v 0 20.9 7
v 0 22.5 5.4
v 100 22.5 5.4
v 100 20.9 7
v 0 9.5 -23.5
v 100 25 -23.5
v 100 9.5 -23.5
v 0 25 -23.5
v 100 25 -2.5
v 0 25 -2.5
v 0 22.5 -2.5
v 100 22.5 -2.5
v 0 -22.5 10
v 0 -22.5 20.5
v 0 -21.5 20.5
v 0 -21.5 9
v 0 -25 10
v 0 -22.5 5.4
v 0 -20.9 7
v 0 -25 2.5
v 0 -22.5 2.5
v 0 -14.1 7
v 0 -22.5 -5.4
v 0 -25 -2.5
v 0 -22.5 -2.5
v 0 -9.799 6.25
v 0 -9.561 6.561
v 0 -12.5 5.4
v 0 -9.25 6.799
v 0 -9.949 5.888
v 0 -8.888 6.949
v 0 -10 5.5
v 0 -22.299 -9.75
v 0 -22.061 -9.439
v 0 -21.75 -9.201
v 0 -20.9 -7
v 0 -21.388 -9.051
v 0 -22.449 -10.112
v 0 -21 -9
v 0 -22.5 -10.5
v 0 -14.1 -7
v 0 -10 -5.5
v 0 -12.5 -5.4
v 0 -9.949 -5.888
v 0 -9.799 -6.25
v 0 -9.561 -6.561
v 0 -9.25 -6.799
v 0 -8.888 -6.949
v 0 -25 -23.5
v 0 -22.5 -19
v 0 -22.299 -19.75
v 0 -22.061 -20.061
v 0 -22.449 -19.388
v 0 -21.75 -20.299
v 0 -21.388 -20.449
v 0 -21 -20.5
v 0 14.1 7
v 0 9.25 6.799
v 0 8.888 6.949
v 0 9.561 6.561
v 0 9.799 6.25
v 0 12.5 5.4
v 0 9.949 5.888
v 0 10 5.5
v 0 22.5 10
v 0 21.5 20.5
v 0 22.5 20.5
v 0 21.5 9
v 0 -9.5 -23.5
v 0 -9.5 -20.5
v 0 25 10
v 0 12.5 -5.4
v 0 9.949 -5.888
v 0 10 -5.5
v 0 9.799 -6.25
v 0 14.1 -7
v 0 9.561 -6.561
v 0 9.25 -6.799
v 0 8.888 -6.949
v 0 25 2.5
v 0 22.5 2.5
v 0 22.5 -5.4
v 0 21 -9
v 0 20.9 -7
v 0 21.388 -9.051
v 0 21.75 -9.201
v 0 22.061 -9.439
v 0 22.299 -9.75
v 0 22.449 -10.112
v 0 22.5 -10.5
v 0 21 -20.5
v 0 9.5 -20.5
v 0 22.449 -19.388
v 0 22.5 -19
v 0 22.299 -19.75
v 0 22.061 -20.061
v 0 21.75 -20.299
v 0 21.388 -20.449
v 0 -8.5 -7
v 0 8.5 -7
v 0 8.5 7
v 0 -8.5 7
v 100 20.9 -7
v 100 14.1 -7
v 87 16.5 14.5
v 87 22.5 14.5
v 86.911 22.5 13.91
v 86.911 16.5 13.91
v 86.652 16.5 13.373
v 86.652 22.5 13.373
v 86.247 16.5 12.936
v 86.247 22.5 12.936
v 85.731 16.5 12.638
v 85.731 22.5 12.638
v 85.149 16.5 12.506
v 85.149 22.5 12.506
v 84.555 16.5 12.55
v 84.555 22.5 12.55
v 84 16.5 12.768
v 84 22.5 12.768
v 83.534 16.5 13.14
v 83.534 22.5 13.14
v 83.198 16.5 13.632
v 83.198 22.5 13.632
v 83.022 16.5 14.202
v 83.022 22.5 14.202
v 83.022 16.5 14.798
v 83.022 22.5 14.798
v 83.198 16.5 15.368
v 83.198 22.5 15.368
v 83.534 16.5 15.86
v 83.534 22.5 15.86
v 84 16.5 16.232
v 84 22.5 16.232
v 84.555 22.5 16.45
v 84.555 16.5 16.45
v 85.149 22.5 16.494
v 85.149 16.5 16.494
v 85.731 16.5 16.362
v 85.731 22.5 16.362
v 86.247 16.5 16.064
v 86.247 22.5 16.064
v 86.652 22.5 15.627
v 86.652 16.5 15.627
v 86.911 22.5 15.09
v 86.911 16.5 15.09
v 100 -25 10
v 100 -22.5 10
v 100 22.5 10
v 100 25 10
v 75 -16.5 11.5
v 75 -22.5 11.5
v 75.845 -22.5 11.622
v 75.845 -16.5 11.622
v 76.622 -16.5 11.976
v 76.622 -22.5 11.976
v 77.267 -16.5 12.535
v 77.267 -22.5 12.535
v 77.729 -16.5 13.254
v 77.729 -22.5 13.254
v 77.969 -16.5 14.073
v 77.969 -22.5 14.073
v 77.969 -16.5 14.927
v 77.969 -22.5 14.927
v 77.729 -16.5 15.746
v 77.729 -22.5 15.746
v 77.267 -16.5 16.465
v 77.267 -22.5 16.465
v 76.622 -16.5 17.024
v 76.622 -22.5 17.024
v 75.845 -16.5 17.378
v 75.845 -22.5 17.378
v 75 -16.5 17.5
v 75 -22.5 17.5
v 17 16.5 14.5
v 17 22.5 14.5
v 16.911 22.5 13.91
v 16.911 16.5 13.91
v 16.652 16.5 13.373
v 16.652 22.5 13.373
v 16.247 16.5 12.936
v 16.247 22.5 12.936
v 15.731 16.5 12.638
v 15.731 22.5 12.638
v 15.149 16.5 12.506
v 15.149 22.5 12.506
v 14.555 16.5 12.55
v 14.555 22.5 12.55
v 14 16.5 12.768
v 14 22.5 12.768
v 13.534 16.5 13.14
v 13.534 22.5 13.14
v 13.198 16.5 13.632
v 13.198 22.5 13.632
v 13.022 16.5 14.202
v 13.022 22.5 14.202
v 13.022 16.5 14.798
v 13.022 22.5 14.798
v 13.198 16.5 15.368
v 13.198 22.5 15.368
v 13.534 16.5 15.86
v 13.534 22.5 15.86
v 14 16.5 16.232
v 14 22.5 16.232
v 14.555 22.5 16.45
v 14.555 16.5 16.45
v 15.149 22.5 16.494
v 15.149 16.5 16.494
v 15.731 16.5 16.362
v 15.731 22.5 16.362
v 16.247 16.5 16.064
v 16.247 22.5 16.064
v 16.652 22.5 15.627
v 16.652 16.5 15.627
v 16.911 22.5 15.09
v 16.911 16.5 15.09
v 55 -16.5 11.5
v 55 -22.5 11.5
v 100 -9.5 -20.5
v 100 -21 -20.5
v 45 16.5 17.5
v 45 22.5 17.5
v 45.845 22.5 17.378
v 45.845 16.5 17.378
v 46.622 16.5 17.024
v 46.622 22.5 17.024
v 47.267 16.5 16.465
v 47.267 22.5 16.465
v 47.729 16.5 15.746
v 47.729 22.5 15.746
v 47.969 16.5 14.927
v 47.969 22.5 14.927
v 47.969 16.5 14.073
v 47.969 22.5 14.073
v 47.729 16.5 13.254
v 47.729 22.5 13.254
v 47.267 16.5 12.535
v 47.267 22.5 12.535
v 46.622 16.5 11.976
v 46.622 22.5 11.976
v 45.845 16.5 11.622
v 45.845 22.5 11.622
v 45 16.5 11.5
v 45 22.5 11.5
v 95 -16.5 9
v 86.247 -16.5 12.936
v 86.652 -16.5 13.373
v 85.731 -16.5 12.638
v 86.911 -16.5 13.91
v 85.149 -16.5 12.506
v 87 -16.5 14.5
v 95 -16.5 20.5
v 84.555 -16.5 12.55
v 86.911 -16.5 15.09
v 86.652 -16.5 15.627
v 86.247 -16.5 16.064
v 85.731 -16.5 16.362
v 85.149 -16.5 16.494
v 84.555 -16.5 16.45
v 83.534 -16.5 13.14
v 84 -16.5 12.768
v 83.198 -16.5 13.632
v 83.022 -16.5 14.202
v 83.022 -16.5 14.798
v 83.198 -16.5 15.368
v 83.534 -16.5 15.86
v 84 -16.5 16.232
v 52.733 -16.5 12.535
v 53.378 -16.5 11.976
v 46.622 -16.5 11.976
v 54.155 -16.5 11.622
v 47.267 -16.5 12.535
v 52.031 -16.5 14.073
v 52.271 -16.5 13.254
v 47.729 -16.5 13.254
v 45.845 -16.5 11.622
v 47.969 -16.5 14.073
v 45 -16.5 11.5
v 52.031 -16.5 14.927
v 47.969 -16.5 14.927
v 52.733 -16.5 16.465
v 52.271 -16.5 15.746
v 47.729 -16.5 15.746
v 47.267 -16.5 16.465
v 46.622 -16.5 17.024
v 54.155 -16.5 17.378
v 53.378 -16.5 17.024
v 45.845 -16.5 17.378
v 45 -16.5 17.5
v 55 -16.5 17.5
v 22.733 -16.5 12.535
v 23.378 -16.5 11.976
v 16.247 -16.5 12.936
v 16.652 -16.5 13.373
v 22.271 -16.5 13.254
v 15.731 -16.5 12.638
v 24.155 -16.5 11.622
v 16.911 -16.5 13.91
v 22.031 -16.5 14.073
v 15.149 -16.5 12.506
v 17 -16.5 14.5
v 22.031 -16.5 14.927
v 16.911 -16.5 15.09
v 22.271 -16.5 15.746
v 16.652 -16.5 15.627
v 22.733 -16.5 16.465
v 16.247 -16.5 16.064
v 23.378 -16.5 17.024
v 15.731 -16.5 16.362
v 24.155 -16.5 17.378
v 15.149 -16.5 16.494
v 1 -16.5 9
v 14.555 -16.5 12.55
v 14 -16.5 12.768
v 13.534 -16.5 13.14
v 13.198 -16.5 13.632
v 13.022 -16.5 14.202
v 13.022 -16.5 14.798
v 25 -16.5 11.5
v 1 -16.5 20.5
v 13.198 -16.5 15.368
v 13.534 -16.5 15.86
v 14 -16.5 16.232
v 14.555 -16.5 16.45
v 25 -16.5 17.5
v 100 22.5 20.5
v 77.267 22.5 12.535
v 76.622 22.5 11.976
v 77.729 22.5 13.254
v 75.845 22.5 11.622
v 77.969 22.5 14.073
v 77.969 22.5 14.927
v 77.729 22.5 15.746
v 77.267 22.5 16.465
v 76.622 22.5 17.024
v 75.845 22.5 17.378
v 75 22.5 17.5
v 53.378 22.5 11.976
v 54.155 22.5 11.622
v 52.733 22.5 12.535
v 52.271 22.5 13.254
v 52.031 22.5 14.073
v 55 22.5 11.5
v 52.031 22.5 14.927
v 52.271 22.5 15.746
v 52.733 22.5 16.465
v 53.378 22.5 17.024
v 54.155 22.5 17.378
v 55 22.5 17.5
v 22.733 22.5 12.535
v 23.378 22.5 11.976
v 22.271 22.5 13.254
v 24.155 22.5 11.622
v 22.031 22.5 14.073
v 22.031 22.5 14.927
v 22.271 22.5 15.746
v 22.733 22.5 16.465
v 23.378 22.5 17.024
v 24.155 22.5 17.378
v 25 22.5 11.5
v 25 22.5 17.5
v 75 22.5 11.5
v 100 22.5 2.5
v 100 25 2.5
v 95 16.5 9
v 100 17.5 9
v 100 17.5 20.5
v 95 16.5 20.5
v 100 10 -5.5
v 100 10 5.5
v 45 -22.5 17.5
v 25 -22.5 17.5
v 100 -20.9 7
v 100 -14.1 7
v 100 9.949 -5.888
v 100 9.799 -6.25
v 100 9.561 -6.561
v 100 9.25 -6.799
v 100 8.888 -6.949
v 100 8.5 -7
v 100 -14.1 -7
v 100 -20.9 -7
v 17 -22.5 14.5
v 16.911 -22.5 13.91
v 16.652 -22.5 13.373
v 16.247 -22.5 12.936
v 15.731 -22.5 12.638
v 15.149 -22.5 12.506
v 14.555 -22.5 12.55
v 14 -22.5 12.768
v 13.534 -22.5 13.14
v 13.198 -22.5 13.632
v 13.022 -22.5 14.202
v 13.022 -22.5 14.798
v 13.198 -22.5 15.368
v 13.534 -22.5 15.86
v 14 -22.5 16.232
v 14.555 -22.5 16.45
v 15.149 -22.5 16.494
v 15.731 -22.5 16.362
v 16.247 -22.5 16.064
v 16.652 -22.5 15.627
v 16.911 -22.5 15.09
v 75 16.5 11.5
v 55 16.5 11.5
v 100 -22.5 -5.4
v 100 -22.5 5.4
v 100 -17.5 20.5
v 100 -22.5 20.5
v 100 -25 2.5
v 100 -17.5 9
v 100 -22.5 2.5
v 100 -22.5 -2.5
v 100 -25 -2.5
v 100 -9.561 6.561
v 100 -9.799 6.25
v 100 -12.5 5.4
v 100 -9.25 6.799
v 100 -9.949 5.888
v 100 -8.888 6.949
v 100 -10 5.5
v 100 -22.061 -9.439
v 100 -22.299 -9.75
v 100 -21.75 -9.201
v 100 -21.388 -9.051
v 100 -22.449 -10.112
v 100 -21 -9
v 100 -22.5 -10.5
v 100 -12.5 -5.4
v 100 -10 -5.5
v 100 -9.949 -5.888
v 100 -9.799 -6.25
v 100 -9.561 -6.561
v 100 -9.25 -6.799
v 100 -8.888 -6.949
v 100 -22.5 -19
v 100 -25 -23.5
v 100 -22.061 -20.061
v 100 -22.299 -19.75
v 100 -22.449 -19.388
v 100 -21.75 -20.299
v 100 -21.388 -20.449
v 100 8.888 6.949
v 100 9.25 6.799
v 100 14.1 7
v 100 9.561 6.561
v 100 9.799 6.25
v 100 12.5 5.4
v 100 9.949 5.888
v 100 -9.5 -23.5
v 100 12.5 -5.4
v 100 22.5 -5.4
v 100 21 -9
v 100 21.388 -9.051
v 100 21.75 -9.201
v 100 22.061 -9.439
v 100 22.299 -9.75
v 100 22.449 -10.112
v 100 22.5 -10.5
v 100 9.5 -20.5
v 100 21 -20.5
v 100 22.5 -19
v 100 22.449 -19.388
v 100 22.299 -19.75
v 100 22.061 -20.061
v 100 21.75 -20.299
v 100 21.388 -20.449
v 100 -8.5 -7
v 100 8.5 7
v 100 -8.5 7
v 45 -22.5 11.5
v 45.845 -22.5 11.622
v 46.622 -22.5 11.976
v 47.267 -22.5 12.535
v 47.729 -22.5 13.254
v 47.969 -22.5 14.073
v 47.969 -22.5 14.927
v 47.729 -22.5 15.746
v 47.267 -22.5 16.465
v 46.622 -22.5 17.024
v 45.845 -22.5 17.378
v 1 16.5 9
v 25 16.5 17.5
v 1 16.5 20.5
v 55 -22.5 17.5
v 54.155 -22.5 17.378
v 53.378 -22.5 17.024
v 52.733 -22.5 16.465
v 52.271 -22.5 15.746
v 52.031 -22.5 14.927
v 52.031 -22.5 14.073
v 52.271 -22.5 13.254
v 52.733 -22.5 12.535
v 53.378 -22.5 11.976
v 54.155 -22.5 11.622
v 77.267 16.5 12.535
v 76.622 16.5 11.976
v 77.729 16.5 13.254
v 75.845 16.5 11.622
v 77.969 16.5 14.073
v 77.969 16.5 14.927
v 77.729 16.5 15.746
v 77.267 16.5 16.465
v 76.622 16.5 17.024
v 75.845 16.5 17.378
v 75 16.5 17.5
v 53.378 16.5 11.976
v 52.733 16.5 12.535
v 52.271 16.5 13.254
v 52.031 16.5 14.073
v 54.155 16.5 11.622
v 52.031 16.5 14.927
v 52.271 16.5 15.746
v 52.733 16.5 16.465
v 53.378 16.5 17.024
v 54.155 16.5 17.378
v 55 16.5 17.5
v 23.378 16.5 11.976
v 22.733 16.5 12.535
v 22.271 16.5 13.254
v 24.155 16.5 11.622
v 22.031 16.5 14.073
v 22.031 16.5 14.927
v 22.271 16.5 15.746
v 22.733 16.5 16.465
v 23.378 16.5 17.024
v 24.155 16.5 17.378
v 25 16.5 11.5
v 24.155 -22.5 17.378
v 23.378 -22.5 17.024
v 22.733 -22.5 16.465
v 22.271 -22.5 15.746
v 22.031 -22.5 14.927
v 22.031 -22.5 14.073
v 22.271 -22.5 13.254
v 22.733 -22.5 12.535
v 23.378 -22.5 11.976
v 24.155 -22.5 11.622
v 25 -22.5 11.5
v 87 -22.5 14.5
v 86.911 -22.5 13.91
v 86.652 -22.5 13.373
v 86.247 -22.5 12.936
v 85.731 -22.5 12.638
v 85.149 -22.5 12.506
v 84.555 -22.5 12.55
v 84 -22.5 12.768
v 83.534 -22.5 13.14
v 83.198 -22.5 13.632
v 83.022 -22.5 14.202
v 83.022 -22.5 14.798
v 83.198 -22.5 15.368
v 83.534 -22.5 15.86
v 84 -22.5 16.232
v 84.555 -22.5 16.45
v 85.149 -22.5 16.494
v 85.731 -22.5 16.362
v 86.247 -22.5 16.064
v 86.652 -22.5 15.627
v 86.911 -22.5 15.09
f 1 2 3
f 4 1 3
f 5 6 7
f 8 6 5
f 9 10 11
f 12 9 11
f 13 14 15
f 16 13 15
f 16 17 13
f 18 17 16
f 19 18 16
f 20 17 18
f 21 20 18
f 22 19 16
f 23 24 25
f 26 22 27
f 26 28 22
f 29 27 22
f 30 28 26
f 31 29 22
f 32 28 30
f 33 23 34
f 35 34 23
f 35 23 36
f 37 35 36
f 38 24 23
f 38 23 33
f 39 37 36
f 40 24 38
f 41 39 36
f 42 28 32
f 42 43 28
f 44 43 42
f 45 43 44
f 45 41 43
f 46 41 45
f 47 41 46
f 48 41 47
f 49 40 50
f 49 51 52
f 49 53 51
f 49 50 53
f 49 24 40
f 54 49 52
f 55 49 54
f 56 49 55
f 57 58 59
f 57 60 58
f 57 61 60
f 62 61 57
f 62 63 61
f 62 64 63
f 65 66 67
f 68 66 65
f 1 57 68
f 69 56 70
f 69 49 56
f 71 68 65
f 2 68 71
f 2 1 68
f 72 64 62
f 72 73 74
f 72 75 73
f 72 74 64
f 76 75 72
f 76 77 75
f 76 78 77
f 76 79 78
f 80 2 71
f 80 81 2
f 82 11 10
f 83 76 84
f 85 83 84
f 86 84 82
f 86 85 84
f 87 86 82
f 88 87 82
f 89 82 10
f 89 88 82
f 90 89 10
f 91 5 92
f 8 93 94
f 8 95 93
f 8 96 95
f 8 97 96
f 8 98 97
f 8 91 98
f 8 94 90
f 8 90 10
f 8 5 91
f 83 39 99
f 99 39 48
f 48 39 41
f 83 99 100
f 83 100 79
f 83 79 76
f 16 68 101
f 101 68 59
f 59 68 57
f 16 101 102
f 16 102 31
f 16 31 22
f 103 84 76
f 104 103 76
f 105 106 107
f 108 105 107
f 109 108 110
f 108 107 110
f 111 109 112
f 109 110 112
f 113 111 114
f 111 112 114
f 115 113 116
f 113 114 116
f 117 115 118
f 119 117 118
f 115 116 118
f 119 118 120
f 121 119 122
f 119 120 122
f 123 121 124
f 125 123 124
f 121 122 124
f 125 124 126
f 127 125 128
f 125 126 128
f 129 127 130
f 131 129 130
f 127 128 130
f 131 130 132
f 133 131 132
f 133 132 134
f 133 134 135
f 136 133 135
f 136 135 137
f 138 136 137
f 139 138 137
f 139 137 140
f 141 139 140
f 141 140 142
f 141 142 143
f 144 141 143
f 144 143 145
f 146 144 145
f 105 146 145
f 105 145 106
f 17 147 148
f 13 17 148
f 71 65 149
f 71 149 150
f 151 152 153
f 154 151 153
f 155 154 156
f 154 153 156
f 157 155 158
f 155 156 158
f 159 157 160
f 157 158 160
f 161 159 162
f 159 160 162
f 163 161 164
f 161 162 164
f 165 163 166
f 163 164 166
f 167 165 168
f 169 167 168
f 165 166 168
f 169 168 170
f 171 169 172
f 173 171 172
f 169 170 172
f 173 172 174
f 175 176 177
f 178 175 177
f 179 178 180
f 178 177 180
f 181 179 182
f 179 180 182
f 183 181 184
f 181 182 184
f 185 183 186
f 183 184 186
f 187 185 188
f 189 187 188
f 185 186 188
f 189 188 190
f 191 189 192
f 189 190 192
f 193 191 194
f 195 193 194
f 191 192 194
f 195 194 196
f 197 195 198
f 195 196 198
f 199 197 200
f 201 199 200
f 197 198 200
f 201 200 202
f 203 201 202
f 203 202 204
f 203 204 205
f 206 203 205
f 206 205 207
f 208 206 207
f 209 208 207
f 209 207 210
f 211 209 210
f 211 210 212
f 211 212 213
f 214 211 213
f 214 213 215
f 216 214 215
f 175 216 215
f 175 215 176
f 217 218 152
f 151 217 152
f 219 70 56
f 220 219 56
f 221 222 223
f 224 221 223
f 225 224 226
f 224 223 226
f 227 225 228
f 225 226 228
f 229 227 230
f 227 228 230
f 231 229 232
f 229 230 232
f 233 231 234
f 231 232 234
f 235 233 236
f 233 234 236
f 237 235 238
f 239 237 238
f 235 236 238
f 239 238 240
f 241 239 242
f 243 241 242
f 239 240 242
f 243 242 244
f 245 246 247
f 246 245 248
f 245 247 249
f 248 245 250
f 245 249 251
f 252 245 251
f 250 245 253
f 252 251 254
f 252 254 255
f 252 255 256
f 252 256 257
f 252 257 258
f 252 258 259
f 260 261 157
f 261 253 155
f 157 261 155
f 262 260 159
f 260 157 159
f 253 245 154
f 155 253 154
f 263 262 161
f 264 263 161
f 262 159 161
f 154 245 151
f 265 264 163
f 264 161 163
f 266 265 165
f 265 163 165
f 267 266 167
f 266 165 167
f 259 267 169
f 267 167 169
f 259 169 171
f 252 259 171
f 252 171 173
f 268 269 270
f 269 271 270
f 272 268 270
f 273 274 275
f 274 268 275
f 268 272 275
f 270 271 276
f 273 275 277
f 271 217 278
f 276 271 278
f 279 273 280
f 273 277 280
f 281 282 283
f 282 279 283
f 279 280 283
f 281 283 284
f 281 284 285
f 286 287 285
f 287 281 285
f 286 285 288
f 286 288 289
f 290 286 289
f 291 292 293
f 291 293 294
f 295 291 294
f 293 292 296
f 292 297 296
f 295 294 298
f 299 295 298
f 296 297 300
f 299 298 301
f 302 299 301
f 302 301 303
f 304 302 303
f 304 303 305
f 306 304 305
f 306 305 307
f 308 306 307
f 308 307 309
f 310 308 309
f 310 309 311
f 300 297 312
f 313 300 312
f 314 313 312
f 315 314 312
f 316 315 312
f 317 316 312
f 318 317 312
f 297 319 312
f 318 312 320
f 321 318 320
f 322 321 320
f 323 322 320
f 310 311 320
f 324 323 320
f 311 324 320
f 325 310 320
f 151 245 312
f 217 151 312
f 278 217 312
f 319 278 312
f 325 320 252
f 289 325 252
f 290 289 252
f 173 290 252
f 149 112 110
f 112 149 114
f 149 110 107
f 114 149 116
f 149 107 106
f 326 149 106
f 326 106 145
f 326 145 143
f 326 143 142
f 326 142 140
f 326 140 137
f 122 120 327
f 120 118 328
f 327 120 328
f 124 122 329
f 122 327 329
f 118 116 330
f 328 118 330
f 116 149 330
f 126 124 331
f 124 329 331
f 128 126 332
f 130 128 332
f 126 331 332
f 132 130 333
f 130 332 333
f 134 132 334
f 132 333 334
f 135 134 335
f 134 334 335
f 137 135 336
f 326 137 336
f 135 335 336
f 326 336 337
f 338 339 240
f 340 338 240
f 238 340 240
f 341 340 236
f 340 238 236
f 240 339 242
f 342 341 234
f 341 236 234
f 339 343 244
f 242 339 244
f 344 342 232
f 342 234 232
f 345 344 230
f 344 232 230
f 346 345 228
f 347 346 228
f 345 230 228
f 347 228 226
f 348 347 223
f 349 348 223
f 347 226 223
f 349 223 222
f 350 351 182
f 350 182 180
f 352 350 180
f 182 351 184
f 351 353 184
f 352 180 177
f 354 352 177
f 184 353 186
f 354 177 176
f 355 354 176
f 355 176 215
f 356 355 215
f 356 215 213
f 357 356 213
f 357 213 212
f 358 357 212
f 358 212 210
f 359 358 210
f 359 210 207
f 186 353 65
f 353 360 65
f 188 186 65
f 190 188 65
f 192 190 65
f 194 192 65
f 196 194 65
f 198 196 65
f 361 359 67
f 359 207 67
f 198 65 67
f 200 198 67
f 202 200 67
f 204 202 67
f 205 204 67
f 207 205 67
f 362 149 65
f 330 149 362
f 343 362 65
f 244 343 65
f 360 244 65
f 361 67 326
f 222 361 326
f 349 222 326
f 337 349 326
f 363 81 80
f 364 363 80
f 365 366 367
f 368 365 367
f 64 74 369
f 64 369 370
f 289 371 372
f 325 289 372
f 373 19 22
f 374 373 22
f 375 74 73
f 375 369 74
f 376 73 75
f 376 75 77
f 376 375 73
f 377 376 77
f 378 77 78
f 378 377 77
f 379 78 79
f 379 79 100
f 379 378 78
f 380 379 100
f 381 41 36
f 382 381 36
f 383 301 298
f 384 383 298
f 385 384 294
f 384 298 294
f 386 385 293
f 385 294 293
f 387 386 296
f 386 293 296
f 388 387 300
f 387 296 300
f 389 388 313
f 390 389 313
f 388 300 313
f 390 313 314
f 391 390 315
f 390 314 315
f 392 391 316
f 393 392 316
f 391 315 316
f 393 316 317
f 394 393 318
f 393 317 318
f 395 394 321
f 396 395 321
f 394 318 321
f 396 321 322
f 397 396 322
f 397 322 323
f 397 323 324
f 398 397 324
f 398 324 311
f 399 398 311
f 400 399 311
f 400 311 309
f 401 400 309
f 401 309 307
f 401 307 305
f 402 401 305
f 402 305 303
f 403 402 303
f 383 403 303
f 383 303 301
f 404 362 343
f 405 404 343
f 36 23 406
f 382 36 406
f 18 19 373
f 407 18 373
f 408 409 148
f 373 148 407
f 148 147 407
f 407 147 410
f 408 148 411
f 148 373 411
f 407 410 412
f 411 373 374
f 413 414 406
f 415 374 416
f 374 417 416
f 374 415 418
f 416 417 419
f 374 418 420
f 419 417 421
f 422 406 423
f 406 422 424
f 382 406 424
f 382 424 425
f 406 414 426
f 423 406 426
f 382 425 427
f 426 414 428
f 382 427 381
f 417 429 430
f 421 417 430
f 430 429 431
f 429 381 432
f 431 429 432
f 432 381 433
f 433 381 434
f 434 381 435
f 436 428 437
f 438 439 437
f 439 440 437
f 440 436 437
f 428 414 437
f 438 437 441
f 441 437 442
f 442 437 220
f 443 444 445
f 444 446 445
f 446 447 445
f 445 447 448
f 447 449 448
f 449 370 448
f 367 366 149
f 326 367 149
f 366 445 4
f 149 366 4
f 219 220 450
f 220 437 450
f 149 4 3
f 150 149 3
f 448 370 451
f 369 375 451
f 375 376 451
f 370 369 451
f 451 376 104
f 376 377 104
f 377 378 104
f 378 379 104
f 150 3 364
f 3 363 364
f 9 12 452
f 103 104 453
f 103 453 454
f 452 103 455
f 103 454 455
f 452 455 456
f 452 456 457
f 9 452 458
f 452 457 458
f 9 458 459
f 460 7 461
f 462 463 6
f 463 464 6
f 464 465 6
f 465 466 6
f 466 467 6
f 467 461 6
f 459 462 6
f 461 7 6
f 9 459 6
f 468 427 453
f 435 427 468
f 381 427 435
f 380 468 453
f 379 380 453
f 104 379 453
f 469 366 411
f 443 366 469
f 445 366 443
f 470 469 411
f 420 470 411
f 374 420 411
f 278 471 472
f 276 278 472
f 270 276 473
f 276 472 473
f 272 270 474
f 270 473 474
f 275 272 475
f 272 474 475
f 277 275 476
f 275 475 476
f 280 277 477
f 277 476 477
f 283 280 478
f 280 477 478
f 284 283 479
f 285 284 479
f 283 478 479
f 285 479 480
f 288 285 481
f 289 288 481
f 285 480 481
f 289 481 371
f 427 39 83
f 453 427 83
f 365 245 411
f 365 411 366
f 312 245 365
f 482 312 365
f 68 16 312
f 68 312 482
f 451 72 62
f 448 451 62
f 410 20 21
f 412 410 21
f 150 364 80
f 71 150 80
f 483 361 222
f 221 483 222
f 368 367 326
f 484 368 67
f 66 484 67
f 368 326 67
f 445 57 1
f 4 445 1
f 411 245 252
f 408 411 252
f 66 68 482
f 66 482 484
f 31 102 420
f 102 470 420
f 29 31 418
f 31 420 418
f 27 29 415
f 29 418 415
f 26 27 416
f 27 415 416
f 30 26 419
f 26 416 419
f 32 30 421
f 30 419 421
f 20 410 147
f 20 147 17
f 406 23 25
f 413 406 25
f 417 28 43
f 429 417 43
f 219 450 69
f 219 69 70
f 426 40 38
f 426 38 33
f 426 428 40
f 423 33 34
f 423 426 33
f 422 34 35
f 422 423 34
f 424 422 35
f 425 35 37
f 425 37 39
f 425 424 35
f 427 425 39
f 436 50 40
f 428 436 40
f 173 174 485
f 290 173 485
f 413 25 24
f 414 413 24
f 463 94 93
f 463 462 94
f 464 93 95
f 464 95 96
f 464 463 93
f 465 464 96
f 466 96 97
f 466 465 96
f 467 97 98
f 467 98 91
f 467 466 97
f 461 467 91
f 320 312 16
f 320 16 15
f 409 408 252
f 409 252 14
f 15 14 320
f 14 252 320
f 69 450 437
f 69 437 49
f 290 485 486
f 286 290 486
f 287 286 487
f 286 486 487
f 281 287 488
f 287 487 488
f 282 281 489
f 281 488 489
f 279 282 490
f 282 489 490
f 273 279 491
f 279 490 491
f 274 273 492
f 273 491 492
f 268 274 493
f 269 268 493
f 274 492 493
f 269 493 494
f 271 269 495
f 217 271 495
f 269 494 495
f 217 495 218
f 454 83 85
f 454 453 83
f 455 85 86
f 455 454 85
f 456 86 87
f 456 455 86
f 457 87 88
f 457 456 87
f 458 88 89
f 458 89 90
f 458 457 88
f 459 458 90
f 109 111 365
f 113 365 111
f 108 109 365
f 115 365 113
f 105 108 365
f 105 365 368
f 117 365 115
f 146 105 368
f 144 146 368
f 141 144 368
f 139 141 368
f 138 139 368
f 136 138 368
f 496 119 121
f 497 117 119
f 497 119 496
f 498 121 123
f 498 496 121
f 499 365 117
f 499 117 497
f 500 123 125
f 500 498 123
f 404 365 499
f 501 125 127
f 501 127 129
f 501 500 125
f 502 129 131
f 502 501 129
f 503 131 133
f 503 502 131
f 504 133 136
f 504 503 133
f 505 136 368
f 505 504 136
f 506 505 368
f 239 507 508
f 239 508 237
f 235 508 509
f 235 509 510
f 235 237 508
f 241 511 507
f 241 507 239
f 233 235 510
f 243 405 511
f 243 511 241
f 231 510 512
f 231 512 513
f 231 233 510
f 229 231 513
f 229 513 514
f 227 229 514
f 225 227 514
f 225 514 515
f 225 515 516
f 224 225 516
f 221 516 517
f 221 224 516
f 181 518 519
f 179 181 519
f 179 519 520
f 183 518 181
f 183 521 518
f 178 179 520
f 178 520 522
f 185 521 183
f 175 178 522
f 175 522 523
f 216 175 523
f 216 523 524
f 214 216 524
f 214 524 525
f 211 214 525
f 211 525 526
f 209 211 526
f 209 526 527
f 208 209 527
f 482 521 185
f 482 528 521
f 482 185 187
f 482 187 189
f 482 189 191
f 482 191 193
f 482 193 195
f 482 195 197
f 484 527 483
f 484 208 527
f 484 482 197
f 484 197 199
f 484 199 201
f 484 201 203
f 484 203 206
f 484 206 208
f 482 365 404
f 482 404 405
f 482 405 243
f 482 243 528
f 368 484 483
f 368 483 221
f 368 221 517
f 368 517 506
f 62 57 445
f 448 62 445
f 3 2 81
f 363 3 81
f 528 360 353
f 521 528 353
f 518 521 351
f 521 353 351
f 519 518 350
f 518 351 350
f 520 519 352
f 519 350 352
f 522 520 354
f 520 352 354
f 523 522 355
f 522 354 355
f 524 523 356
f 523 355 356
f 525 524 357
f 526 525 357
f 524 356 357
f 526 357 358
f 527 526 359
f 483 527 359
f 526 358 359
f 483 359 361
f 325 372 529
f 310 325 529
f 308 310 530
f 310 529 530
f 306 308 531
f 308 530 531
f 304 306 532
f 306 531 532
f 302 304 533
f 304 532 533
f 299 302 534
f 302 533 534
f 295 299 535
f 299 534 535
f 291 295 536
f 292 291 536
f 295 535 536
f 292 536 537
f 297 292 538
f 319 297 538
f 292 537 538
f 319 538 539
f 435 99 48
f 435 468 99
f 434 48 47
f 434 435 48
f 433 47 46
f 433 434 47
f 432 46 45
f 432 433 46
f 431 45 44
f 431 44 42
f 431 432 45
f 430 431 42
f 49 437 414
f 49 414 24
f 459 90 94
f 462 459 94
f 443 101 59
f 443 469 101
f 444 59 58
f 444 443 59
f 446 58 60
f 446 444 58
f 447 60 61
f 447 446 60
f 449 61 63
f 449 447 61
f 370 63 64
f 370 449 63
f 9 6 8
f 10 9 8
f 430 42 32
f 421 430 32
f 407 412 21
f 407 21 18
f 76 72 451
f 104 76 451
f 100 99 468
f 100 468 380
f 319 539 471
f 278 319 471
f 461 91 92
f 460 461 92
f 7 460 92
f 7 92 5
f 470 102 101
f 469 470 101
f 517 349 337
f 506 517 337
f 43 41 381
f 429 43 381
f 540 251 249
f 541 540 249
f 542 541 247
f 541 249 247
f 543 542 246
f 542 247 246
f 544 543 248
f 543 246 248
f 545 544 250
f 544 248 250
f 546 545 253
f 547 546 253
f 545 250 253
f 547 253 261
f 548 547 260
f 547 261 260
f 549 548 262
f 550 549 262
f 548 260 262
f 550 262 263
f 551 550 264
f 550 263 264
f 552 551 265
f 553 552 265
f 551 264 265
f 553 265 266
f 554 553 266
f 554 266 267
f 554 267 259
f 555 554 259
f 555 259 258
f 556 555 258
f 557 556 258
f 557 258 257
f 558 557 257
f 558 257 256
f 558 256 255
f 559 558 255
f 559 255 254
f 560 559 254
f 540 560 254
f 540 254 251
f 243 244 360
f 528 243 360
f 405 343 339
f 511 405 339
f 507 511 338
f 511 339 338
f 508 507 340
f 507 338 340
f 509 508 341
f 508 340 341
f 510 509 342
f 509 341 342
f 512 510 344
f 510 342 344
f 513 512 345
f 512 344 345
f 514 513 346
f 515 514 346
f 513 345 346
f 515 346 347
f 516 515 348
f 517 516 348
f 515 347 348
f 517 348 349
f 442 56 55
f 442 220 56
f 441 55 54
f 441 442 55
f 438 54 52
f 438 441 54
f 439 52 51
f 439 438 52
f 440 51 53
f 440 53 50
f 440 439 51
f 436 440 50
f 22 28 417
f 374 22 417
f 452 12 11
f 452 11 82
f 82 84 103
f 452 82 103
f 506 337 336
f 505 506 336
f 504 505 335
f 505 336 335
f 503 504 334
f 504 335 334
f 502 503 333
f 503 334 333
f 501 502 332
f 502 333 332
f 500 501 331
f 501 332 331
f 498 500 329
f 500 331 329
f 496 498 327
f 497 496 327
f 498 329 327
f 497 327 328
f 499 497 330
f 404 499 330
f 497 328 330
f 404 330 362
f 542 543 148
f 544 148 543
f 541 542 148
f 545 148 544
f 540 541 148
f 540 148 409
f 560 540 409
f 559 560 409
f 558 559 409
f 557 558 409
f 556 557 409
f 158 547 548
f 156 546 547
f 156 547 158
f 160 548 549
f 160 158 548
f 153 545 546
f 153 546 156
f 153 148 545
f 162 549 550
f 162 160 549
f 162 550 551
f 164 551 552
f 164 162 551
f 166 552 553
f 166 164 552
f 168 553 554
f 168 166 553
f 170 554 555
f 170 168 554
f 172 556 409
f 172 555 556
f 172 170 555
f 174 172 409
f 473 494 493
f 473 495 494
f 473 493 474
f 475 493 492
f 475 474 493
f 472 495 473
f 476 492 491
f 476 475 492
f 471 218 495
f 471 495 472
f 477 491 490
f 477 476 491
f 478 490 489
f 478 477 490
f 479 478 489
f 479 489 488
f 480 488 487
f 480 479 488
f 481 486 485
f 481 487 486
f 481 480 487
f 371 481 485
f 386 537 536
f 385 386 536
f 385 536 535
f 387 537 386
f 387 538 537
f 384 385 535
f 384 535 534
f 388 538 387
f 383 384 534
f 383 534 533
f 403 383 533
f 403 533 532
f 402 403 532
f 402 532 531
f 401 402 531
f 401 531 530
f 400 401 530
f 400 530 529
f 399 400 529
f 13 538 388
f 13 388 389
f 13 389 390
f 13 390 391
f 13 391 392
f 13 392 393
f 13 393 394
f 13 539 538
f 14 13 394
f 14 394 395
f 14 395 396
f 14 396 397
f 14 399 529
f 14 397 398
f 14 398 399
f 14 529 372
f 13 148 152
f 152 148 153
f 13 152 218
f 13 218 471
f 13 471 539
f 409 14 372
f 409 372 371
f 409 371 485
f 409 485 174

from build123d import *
from OCP.BRepFilletAPI import BRepFilletAPI_MakeChamfer

# Parameters (mm, degrees)
SCHIZZO1_W                   = 100
SCHIZZO1_H                   = 50
ESTRUSIONE_ESTRUSIONE1_DEPTH = 44
SCHIZZO2_W                   = 10.499999851
SCHIZZO2_H                   = 2.500000367
TAGLIO_ESTRUSIONE1_DEPTH     = 106.722514159
TAGLIO_ESTRUSIONE2_DEPTH     = 106.722514247
TAGLIO_ESTRUSIONE3_DEPTH     = 106.722514247
TAGLIO_ESTRUSIONE4_DEPTH     = 106.722514247
SCHIZZO6_W                   = 10.499999851
SCHIZZO6_H                   = 2.500000367
TAGLIO_ESTRUSIONE5_DEPTH     = 106.722514247
SCHIZZO7_W                   = 11.49999996
SCHIZZO7_H                   = 32.999999858
TAGLIO_ESTRUSIONE6_DEPTH     = 106.722514247
TAGLIO_ESTRUSIONE7_REACH     = 115.175
TAGLIO_ESTRUSIONE8_REACH     = 115.175
TAGLIO_ESTRUSIONE9_REACH     = 115.175
TAGLIO_ESTRUSIONE10_REACH    = 115.175
SCHIZZO12_W                  = 14.000000092
SCHIZZO12_H                  = 20
TAGLIO_ESTRUSIONE11_DEPTH    = 106.722514247
FORO_4_0_4_1_D               = 4
FORO_4_0_4_1_DEPTH           = 8.500000443
FORO_4_0_4_2_D               = 4
FORO_4_0_4_2_DEPTH           = 47.500000379
SMUSSO1_SIZE                 = 5
SMUSSO1_SIZE2                = 1
SMUSSO2_SIZE                 = 1.6
SMUSSO3_SIZE                 = 1
SMUSSO3_SIZE2                = 5
RACCORDO1_R                  = 1.5


with BuildPart() as part:
    # Schizzo1 → Estrusione-Estrusione1 (new body)
    with BuildSketch(Plane(origin=(0, 0, -23.5), x_dir=(-1, 0, 0), z_dir=(0, 0, -1))):
        with Locations((-50, 0)):
            Rectangle(SCHIZZO1_W, SCHIZZO1_H)
    extrude(amount=-ESTRUSIONE_ESTRUSIONE1_DEPTH)

    # Schizzo2 → Taglio-Estrusione1 (cut, through all)
    with BuildSketch(Plane.ZY):
        with Locations((15.250000075, -23.750000189)):
            Rectangle(SCHIZZO2_W, SCHIZZO2_H)
    extrude(amount=-TAGLIO_ESTRUSIONE1_DEPTH, mode=Mode.SUBTRACT)

    # Schizzo3 → Taglio-Estrusione2 (cut, through all)
    with BuildSketch(Plane.ZY):
        Polygon((-2.5, -25), (2.5, -25), (2.5, -22.5), (7, -22.5), (7, -12.5), (-7, -12.5), (-7, -22.5), (-2.5, -22.5), align=None)
    extrude(amount=-TAGLIO_ESTRUSIONE2_DEPTH, mode=Mode.SUBTRACT)

    # Schizzo4 → Taglio-Estrusione3 (cut, through all)
    with BuildSketch(Plane.ZY):
        Polygon((-23.5, 9.5), (-23.5, -9.5), (-20.5, -9.5), (-20.5, -22.5), (-9, -22.5), (-9, 22.5), (-20.5, 22.5), (-20.5, 9.5), align=None)
    extrude(amount=-TAGLIO_ESTRUSIONE3_DEPTH, mode=Mode.SUBTRACT)

    # Schizzo5 → Taglio-Estrusione4 (cut, through all)
    with BuildSketch(Plane.ZY):
        Polygon((2.5, 25), (-2.5, 25), (-2.5, 22.5), (-7, 22.5), (-7, 12.5), (7, 12.5), (7, 22.5), (2.5, 22.5), align=None)
    extrude(amount=-TAGLIO_ESTRUSIONE4_DEPTH, mode=Mode.SUBTRACT)

    # Schizzo6 → Taglio-Estrusione5 (cut, through all)
    with BuildSketch(Plane.ZY):
        with Locations((15.250000075, 23.750000189)):
            Rectangle(SCHIZZO6_W, SCHIZZO6_H)
    extrude(amount=-TAGLIO_ESTRUSIONE5_DEPTH, mode=Mode.SUBTRACT)

    # Schizzo7 → Taglio-Estrusione6 (cut, through all)
    with BuildSketch(Plane.ZY):
        with Locations((14.75000002, 0)):
            Rectangle(SCHIZZO7_W, SCHIZZO7_H)
    extrude(amount=-TAGLIO_ESTRUSIONE6_DEPTH, mode=Mode.SUBTRACT)

    # Schizzo8 → Taglio-Estrusione7 (cut, up to next)
    with BuildSketch(Plane(origin=(0, 22.500000006, 0), x_dir=(-1, 0, 0), z_dir=(0, 1, 0)), mode=Mode.PRIVATE) as taglio_estrusione7_sk1:
        with BuildLine():
            Line((-75, 11.500000046), (-55, 11.500000046))
            ThreePointArc((-55, 11.500000046), (-52, 14.500000046), (-55, 17.500000046))
            Line((-55, 17.500000046), (-75, 17.500000046))
            ThreePointArc((-75, 17.500000046), (-78, 14.500000046), (-75, 11.500000046))
        make_face()
    taglio_estrusione7_tool1 = extrude(taglio_estrusione7_sk1.sketch, amount=-TAGLIO_ESTRUSIONE7_REACH, mode=Mode.PRIVATE) & part.part
    add(taglio_estrusione7_tool1.solids().sort_by_distance((65, 22.5, 14.5))[0], mode=Mode.SUBTRACT)

    # Schizzo9 → Taglio-Estrusione8 (cut, up to next)
    with BuildSketch(Plane(origin=(0, 22.500000006, 0), x_dir=(-1, 0, 0), z_dir=(0, 1, 0)), mode=Mode.PRIVATE) as taglio_estrusione8_sk1:
        with BuildLine():
            Line((-25, 17.500000046), (-45, 17.500000046))
            ThreePointArc((-45, 17.500000046), (-48, 14.500000046), (-45, 11.500000046))
            Line((-45, 11.500000046), (-25, 11.500000046))
            ThreePointArc((-25, 11.500000046), (-22, 14.500000046), (-25, 17.500000046))
        make_face()
    taglio_estrusione8_tool1 = extrude(taglio_estrusione8_sk1.sketch, amount=-TAGLIO_ESTRUSIONE8_REACH, mode=Mode.PRIVATE) & part.part
    add(taglio_estrusione8_tool1.solids().sort_by_distance((35, 22.5, 14.5))[0], mode=Mode.SUBTRACT)

    # Schizzo10 → Taglio-Estrusione9 (cut, up to next)
    with BuildSketch(Plane.XZ.offset(22.500000006), mode=Mode.PRIVATE) as taglio_estrusione9_sk1:
        with BuildLine():
            Line((55, 11.500000046), (75, 11.500000046))
            ThreePointArc((75, 11.500000046), (78, 14.500000046), (75, 17.500000046))
            Line((75, 17.500000046), (55, 17.500000046))
            ThreePointArc((55, 17.500000046), (52, 14.500000046), (55, 11.500000046))
        make_face()
    taglio_estrusione9_tool1 = extrude(taglio_estrusione9_sk1.sketch, amount=-TAGLIO_ESTRUSIONE9_REACH, mode=Mode.PRIVATE) & part.part
    add(taglio_estrusione9_tool1.solids().sort_by_distance((65, -22.5, 14.5))[0], mode=Mode.SUBTRACT)

    # Schizzo11 → Taglio-Estrusione10 (cut, up to next)
    with BuildSketch(Plane.XZ.offset(22.500000006), mode=Mode.PRIVATE) as taglio_estrusione10_sk1:
        with BuildLine():
            Line((45, 17.500000046), (25, 17.500000046))
            ThreePointArc((25, 17.500000046), (22, 14.500000046), (25, 11.500000046))
            Line((25, 11.500000046), (45, 11.500000046))
            ThreePointArc((45, 11.500000046), (48, 14.500000046), (45, 17.500000046))
        make_face()
    taglio_estrusione10_tool1 = extrude(taglio_estrusione10_sk1.sketch, amount=-TAGLIO_ESTRUSIONE10_REACH, mode=Mode.PRIVATE) & part.part
    add(taglio_estrusione10_tool1.solids().sort_by_distance((35, -22.5, 14.5))[0], mode=Mode.SUBTRACT)

    # Schizzo12 → Taglio-Estrusione11 (cut, through all)
    with BuildSketch(Plane.ZY):
        Rectangle(SCHIZZO12_W, SCHIZZO12_H)
    extrude(amount=-TAGLIO_ESTRUSIONE11_DEPTH, mode=Mode.SUBTRACT)

    # Foro Ø4.0 (4)-1
    with Locations(Plane(origin=(0, 16.499999929, 0), x_dir=(-1, 0, 0), z_dir=(0, -1, 0))):
        with Locations((-85, -14.500000203), (-15, -14.500000203)):
            Hole(FORO_4_0_4_1_D / 2, depth=FORO_4_0_4_1_DEPTH)

    # Foro Ø4.0 (4)-2
    with Locations(Plane(origin=(0, -22.500000006, 0), x_dir=(-1, 0, 0), z_dir=(0, -1, 0))):
        with Locations((-85, -14.5), (-15, -14.5)):
            Hole(FORO_4_0_4_2_D / 2, depth=FORO_4_0_4_2_DEPTH)

    # Smusso1: one chamfer whose edges measure the first distance from different faces: ONE call of the kernel's chamfer builder (chamfer() names one face for all edges)
    smusso1_edges_1 = [part.edges().sort_by_distance(p)[0] for p in [
        (100, 16.499999929, 14.75000002),
    ]]
    smusso1_side_1 = [part.faces().sort_by_distance(p)[0] for p in [
        (50, 16.499999929, 14.847088678),
    ]]
    smusso1_edges_2 = [part.edges().sort_by_distance(p)[0] for p in [
        (0, -16.499999929, 14.75000002),
    ]]
    smusso1_side_2 = [part.faces().sort_by_distance(p)[0] for p in [
        (0, -17.25, -22.833966968),
    ]]
    smusso1 = BRepFilletAPI_MakeChamfer(part.part.solid().wrapped)
    for e in smusso1_edges_1:
        smusso1.Add(SMUSSO1_SIZE, SMUSSO1_SIZE2, e.wrapped, smusso1_side_1[0].wrapped)  # the first distance lies on this face
    for e in smusso1_edges_2:
        smusso1.Add(SMUSSO1_SIZE, SMUSSO1_SIZE2, e.wrapped, smusso1_side_2[0].wrapped)  # the first distance lies on this face
    add(Compound.cast(smusso1.Shape()), mode=Mode.REPLACE)

    # Smusso2
    smusso2_edges = [part.edges().sort_by_distance(p)[0] for p in [
        (50, 12.5, 7),
        (50, 12.5, -7),
        (50, 22.5, -7),
        (50, -22.5, -7),
        (50, -12.5, -7),
        (50, -12.5, 7),
        (50, -22.5, 7),
        (50, 22.5, 7),
    ]]
    chamfer(smusso2_edges, length=SMUSSO2_SIZE)

    # Smusso3: one chamfer whose edges measure the first distance from different faces: ONE call of the kernel's chamfer builder (chamfer() names one face for all edges)
    smusso3_edges_1 = [part.edges().sort_by_distance(p)[0] for p in [
        (100, -16.499999929, 14.75000002),
    ]]
    smusso3_side_1 = [part.faces().sort_by_distance(p)[0] for p in [
        (100, -23.166033032, 3.95),
    ]]
    smusso3_edges_2 = [part.edges().sort_by_distance(p)[0] for p in [
        (0, 16.499999929, 14.75000002),
    ]]
    smusso3_side_2 = [part.faces().sort_by_distance(p)[0] for p in [
        (47.5, 16.499999929, 19.543064788),
    ]]
    smusso3 = BRepFilletAPI_MakeChamfer(part.part.solid().wrapped)
    for e in smusso3_edges_1:
        smusso3.Add(SMUSSO3_SIZE, SMUSSO3_SIZE2, e.wrapped, smusso3_side_1[0].wrapped)  # the first distance lies on this face
    for e in smusso3_edges_2:
        smusso3.Add(SMUSSO3_SIZE, SMUSSO3_SIZE2, e.wrapped, smusso3_side_2[0].wrapped)  # the first distance lies on this face
    add(Compound.cast(smusso3.Shape()), mode=Mode.REPLACE)

    # Raccordo1
    raccordo1_edges = [part.edges().sort_by_distance(p)[0] for p in [
        (50, -10, 7.000000046),
        (50, -10, -7.000000046),
        (50, 10, -7.000000046),
        (50, 10, 7.000000046),
        (50, 22.5, -20.5),
        (50, 22.5, -9),
        (50, -22.5, -9),
        (50, -22.5, -20.5),
    ]]
    fillet(raccordo1_edges, radius=RACCORDO1_R)


solid = part.part
